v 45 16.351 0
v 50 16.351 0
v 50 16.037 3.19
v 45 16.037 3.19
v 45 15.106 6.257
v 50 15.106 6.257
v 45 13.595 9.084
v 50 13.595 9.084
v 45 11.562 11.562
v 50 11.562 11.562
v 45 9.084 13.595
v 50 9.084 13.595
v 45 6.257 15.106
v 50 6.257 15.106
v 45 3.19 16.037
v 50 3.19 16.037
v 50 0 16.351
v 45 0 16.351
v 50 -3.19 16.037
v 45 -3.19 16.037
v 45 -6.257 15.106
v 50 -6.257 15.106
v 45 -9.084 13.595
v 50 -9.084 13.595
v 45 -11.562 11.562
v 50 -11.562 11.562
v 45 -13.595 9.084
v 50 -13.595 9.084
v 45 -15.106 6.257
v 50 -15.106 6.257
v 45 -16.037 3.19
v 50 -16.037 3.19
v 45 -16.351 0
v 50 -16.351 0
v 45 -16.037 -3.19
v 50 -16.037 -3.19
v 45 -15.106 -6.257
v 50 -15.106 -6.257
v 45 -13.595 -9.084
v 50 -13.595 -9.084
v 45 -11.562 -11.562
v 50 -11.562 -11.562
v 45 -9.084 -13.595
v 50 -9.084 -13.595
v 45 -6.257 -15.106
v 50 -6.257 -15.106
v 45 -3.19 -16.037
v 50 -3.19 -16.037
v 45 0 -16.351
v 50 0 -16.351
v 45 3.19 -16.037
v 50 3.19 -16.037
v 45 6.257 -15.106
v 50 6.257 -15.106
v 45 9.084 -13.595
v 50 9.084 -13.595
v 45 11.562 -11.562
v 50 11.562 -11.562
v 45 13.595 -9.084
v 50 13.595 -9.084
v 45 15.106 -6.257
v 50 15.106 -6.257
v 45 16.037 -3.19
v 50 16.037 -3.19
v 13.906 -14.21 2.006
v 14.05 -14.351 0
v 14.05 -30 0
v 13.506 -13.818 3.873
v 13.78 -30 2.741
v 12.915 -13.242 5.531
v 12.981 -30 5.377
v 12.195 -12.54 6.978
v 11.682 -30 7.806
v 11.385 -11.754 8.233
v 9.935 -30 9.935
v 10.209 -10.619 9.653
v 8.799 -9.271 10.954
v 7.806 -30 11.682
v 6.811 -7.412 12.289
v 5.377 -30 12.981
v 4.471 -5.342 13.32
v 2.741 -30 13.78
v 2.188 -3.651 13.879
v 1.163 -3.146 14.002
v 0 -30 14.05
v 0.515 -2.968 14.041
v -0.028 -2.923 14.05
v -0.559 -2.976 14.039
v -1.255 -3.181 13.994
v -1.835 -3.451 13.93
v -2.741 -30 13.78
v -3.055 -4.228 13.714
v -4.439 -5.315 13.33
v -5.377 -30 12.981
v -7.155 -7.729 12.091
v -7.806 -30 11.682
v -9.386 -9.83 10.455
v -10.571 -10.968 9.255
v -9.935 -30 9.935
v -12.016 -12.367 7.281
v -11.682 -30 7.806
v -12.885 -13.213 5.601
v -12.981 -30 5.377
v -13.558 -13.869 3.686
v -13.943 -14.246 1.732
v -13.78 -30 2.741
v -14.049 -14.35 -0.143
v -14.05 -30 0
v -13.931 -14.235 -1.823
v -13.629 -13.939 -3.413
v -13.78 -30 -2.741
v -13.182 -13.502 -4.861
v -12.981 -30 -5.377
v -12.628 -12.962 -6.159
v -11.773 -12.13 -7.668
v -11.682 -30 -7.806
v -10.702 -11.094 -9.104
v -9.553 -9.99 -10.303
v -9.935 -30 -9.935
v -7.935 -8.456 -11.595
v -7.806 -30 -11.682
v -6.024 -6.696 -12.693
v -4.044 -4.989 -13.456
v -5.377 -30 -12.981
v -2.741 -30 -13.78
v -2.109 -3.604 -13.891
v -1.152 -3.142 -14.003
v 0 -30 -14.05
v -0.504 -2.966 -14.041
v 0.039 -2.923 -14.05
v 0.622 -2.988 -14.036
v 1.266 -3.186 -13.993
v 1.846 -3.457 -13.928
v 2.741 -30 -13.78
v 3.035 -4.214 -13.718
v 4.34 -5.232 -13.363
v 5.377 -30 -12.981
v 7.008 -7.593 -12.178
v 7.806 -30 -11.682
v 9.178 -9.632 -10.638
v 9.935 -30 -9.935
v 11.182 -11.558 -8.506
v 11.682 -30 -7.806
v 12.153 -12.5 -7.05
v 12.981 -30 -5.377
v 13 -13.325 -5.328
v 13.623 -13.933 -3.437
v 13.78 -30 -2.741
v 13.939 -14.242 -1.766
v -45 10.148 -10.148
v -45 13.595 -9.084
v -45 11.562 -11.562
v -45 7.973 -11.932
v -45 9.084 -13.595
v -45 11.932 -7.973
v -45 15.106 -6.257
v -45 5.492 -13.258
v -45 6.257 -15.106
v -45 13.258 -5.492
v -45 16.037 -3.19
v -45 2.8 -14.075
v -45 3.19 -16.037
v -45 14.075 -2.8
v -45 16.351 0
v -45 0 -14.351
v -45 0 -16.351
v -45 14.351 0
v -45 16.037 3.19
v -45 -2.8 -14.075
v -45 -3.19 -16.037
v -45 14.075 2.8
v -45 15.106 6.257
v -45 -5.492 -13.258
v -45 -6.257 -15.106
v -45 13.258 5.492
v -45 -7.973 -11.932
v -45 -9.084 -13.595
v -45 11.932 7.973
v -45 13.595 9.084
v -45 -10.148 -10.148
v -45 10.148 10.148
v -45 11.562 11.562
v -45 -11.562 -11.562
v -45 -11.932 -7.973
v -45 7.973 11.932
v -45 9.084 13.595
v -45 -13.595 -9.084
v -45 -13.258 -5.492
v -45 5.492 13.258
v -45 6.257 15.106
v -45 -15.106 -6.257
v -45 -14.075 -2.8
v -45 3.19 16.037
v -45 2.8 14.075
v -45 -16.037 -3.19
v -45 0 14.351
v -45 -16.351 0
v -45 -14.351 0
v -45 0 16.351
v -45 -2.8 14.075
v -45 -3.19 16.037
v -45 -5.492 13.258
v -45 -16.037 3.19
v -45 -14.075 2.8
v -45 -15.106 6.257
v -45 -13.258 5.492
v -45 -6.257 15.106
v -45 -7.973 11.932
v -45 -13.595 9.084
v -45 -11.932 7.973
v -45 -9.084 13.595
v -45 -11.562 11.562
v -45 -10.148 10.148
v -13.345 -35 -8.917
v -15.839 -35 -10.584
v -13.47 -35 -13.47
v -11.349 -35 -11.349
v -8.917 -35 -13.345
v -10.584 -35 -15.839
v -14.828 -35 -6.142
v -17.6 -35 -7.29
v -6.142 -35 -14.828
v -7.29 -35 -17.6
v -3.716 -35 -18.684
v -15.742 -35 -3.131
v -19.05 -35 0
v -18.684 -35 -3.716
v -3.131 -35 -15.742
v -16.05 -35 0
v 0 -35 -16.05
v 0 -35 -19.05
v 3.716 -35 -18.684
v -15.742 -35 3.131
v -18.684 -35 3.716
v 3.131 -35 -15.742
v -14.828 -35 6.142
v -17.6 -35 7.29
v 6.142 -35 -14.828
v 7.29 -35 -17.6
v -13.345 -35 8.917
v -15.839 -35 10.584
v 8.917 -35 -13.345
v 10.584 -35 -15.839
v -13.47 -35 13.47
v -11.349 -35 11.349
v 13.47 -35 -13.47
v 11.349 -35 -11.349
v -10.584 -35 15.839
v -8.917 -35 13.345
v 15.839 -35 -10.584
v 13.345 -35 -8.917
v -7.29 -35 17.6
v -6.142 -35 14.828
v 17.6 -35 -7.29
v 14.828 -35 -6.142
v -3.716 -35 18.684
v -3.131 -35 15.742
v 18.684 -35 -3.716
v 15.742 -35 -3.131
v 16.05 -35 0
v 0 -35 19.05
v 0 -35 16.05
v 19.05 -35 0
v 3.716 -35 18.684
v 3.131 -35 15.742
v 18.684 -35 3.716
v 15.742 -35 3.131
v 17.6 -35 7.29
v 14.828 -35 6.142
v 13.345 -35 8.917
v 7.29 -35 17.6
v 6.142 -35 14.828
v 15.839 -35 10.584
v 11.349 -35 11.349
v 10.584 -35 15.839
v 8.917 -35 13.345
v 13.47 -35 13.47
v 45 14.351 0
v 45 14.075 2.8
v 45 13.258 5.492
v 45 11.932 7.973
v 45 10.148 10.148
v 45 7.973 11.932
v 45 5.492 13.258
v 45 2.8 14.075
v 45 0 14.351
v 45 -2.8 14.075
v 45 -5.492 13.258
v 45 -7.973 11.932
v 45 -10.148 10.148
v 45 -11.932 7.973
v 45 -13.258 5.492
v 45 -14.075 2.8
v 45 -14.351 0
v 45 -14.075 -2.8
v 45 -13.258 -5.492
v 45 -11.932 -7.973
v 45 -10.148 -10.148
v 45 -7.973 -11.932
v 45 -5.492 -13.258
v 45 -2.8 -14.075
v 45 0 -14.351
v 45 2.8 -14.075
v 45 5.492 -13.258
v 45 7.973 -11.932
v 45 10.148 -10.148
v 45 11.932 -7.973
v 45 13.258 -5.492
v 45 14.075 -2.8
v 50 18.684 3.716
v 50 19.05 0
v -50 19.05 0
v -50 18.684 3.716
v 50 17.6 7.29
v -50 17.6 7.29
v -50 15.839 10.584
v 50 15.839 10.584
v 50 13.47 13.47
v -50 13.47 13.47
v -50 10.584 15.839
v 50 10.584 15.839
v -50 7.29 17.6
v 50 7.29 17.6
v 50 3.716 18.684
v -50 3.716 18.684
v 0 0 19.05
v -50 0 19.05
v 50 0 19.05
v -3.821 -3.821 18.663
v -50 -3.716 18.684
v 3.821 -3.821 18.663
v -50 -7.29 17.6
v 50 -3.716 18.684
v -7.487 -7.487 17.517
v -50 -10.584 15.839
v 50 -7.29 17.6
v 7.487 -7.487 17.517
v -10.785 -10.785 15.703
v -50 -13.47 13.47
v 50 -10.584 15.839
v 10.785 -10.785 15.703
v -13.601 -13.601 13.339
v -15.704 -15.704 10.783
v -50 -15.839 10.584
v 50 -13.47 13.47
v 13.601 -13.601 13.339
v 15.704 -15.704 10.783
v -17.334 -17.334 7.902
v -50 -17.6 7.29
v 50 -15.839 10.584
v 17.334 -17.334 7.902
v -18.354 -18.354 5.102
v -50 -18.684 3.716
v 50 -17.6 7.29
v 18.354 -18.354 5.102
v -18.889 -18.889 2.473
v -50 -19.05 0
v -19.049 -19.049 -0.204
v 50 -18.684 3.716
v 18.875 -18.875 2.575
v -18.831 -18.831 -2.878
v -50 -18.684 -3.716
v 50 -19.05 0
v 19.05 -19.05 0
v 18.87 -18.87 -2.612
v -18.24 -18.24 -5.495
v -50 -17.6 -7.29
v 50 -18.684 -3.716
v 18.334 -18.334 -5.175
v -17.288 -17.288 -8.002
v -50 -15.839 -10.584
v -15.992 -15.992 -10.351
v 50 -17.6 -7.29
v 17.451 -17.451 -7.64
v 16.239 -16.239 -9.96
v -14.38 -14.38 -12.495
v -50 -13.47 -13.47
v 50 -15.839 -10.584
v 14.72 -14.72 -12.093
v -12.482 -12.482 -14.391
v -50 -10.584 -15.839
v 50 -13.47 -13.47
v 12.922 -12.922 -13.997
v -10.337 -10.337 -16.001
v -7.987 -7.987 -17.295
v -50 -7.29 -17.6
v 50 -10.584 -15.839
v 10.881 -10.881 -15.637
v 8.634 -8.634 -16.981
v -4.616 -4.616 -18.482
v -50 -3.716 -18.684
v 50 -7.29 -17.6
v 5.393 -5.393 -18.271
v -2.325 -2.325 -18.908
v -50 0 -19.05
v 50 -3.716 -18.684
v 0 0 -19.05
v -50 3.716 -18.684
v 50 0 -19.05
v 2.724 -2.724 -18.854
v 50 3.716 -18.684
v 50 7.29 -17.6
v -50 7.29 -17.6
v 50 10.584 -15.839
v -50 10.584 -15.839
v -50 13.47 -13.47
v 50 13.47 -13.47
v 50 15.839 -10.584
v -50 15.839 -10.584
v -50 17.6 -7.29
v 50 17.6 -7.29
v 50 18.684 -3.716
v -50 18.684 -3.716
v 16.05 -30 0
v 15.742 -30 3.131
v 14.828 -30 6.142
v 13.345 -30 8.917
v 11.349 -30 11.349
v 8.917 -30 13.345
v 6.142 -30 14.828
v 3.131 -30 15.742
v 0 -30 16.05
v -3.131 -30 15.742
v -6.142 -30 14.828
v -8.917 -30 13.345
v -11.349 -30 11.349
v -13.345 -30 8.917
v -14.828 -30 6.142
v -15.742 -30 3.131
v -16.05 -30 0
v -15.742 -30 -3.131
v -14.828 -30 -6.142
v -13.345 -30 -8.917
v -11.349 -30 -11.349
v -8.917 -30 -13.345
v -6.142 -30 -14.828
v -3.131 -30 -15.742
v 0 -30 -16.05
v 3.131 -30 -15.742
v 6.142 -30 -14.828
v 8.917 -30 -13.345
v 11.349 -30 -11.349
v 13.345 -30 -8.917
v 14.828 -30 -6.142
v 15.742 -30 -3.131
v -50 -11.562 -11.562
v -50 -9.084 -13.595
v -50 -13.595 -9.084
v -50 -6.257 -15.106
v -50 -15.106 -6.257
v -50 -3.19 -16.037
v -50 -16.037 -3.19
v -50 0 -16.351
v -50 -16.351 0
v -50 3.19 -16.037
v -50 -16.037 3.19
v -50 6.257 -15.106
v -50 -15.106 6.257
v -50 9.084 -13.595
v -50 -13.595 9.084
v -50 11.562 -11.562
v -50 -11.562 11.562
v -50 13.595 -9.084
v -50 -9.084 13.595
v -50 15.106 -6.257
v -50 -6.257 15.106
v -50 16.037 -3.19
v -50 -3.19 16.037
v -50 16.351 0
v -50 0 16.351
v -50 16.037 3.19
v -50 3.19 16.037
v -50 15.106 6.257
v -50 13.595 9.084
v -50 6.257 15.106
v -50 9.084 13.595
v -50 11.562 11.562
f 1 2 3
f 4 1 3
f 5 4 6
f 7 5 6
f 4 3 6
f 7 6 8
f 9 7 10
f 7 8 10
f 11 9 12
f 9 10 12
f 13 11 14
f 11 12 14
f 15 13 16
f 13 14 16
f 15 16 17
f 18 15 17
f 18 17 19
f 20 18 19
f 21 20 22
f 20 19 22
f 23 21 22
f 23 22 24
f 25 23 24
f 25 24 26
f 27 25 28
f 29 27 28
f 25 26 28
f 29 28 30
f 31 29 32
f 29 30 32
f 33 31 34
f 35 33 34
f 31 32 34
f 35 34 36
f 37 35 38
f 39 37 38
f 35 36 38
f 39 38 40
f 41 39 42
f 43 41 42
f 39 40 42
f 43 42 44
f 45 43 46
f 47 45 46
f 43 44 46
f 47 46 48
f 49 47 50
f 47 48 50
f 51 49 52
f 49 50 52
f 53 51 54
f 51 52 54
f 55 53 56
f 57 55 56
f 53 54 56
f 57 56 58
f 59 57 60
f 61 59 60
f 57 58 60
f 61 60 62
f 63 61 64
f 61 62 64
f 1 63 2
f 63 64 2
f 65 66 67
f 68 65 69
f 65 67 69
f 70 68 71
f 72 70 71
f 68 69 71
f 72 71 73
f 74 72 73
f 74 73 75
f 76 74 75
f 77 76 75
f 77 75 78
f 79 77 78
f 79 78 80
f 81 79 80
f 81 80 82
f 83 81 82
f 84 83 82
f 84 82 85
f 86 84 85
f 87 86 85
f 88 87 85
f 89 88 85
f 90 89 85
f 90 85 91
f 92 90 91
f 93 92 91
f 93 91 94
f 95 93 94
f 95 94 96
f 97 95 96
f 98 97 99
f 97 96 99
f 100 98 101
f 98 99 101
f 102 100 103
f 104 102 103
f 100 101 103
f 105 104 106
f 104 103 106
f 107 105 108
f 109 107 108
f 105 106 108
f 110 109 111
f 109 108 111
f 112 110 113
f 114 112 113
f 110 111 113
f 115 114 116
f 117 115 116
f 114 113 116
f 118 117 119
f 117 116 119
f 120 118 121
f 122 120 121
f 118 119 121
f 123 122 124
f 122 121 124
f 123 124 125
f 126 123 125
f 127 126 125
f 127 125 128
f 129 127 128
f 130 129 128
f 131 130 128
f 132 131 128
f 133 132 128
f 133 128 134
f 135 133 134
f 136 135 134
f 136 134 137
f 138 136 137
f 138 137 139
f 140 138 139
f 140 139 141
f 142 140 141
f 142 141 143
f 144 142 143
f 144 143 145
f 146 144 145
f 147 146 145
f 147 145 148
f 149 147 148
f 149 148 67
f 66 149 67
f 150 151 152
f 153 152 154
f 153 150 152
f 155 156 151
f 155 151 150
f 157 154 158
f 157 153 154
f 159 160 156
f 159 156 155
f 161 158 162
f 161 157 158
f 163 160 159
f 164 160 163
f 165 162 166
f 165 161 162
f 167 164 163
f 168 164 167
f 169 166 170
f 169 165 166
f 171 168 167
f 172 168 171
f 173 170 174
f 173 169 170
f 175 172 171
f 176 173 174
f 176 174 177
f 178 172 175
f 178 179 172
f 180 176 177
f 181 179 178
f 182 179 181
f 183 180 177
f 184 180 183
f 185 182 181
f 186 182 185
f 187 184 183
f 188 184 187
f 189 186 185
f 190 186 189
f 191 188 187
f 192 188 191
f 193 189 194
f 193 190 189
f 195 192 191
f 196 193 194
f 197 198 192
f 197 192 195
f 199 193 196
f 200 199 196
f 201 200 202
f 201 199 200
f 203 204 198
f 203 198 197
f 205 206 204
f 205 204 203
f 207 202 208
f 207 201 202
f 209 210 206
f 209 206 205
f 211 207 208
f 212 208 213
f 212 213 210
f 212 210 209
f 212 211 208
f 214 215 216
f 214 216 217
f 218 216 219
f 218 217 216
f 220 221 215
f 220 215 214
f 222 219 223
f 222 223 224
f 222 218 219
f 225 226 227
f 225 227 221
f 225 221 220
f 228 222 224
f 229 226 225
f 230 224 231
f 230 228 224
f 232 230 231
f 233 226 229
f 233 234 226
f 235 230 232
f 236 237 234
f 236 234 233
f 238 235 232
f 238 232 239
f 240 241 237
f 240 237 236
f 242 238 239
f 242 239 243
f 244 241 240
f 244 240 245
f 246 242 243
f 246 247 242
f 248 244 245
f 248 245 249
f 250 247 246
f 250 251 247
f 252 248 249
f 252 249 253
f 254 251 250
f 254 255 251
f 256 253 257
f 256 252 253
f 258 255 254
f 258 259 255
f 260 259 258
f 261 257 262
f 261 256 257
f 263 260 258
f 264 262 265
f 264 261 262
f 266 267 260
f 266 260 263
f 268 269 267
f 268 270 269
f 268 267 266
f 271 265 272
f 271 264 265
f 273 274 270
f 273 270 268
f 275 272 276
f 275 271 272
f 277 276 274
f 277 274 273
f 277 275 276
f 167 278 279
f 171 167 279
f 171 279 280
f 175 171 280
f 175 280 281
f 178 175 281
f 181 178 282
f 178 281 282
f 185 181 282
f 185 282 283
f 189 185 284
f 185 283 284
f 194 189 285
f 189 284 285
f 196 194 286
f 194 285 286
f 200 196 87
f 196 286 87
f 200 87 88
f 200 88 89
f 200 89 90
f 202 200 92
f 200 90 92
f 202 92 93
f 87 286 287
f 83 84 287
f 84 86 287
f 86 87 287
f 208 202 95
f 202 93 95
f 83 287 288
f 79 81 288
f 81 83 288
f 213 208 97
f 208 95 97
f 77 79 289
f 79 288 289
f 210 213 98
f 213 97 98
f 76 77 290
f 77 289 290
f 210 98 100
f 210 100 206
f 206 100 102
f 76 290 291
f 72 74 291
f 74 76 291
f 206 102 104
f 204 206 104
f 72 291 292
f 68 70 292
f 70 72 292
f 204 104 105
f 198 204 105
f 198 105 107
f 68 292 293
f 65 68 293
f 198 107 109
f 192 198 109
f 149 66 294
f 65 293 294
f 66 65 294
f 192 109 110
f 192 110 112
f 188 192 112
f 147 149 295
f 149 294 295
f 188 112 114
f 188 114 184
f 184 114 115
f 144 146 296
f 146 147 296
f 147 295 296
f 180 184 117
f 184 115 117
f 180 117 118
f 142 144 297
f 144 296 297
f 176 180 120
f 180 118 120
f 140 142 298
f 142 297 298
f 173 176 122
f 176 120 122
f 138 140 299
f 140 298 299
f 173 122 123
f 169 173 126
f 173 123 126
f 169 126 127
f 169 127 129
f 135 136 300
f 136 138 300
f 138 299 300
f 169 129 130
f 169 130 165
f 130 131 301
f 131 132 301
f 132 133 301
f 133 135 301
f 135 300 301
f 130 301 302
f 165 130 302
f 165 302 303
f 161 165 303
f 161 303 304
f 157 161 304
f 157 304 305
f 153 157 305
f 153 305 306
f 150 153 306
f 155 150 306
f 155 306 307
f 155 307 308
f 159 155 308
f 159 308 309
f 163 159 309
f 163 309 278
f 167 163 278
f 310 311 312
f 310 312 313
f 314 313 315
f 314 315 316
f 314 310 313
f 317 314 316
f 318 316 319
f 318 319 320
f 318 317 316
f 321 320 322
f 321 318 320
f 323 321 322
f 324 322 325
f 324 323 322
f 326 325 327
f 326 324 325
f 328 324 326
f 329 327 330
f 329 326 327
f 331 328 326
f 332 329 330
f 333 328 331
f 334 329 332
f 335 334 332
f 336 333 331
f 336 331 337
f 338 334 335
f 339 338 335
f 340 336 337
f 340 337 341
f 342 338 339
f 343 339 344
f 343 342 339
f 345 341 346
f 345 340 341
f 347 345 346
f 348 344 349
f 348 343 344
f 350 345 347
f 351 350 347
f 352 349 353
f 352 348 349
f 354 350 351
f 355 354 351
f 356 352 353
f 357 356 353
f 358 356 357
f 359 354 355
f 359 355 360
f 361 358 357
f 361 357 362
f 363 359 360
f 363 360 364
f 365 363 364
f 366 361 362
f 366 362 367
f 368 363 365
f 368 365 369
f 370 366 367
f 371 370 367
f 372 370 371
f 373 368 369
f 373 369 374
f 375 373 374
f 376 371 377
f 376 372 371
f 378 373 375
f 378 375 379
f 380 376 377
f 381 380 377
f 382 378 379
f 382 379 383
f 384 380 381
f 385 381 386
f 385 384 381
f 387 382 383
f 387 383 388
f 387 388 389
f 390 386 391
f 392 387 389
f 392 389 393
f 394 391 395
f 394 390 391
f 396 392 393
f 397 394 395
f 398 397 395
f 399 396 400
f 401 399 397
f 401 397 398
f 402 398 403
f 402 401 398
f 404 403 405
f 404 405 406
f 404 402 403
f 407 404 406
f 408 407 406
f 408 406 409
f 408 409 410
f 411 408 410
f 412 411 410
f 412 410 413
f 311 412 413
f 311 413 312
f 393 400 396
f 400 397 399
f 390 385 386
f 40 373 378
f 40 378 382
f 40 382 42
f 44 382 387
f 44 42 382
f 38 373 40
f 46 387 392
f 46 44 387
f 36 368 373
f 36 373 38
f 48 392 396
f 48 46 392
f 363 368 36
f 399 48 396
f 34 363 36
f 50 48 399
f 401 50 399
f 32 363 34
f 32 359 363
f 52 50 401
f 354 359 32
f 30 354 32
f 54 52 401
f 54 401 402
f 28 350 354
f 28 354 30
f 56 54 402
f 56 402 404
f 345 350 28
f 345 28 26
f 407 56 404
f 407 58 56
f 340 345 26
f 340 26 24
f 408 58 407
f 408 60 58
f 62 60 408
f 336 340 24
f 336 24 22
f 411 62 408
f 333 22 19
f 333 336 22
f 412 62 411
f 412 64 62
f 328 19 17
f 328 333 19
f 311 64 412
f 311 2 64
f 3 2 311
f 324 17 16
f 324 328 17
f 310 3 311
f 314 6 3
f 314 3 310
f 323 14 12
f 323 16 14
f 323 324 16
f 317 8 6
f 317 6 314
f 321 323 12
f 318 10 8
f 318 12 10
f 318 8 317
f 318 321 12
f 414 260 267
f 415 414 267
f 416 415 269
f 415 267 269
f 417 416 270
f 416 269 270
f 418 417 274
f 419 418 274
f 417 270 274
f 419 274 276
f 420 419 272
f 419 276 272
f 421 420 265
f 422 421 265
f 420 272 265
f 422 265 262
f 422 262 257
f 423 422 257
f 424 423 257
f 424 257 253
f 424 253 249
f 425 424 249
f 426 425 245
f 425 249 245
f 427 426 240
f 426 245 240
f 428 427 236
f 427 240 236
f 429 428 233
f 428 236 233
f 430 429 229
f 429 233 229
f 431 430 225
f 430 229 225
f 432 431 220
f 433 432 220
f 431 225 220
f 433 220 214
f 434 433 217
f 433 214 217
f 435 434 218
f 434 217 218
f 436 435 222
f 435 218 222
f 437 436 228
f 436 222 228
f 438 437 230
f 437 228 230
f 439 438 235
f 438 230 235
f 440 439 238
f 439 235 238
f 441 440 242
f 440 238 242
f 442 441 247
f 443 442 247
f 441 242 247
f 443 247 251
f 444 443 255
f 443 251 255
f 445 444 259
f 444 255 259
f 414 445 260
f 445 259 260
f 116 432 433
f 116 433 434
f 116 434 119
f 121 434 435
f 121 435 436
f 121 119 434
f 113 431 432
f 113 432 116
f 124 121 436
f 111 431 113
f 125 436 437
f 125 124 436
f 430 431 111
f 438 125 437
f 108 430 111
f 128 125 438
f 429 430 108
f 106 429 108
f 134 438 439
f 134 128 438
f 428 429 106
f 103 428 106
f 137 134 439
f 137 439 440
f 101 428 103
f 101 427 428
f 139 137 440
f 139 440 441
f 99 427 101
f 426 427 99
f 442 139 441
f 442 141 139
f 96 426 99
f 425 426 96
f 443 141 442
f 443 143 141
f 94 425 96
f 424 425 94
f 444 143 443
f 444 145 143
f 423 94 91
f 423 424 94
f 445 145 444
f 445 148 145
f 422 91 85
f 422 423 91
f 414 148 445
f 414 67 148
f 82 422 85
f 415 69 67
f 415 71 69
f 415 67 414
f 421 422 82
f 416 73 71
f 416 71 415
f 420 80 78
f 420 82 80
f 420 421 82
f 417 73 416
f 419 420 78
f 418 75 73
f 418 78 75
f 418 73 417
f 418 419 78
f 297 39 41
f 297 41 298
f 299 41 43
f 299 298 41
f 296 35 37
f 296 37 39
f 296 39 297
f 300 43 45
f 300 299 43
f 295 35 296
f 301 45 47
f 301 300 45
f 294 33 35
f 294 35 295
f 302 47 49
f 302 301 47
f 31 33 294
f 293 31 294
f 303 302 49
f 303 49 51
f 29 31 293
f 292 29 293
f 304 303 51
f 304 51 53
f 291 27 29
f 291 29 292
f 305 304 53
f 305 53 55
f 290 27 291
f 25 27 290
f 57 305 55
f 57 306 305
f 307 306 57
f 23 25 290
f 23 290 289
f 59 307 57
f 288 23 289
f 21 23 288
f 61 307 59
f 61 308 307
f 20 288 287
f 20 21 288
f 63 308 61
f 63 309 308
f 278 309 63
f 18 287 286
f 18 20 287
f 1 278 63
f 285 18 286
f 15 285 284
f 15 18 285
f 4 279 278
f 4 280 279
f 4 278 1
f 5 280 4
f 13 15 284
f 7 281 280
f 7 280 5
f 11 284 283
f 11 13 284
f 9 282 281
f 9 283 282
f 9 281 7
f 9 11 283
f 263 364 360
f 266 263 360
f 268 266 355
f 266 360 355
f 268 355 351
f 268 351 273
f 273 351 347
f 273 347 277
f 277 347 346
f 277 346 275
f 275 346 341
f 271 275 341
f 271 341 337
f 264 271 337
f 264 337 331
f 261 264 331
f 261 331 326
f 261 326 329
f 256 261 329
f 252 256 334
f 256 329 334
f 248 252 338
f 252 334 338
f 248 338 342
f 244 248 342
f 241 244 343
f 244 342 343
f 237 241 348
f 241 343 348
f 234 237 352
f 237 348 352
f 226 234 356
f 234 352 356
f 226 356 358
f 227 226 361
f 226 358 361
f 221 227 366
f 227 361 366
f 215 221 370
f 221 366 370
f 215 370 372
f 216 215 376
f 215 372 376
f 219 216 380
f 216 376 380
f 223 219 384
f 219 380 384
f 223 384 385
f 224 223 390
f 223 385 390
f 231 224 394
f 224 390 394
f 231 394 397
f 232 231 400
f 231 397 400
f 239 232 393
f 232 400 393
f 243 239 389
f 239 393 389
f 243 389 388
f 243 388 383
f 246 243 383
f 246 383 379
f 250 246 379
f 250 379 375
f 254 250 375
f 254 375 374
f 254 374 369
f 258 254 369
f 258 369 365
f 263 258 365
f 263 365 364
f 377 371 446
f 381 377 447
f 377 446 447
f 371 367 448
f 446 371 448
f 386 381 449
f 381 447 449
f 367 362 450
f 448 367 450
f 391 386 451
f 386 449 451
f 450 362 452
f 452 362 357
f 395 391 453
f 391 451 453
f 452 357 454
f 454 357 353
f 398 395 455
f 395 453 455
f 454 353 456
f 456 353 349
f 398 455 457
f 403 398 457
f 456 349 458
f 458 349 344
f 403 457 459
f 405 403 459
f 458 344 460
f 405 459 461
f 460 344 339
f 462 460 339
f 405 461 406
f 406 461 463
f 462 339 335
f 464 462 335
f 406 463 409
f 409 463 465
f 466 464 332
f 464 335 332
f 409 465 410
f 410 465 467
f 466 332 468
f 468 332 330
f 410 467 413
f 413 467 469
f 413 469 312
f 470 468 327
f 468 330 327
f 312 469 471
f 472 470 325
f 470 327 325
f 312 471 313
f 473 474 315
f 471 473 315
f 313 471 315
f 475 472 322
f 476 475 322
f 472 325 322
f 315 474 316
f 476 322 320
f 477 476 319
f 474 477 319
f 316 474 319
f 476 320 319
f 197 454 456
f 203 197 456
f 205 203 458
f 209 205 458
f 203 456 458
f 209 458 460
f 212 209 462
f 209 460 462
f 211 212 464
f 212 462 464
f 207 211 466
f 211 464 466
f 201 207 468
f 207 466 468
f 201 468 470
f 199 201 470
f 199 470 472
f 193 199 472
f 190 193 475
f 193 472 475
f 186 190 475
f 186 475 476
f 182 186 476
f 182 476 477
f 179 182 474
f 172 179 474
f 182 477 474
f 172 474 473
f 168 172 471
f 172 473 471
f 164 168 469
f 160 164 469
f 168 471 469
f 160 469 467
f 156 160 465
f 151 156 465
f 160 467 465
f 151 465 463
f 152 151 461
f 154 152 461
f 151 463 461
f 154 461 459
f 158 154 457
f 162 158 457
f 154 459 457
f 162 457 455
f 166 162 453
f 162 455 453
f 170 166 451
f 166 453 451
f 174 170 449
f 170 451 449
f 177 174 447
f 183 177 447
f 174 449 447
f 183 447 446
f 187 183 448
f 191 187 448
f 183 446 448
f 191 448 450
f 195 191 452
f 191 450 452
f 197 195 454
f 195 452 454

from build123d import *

# Parameters (mm, degrees)
F0_R      = 19.05
F2_DEPTH  = 50
F1_R      = 19.05
F4_DEPTH  = 35
F3_R      = 14.3508300954
F5_DEPTH  = 100.001
F6_R      = 14.05
F7_DEPTH  = 32.078017988
F8_R      = 16.05
F9_DEPTH  = 5
F10_R     = 16.3508300954
F11_DEPTH = 5
F12_R     = 16.3508300954
F13_DEPTH = 5


with BuildPart() as f2:
    # F0 (on Right) → F2 (new body, symmetric)
    with BuildSketch(Plane.YZ):
        Circle(F0_R)
    extrude(amount=F2_DEPTH, both=True)

    # F1 (on Front) → F4 (join)
    with BuildSketch(Plane.XZ):
        Circle(F1_R)
    extrude(amount=F4_DEPTH)

    # F3 (on face) → F5 (cut, through all)
    with BuildSketch(Plane.YZ.offset(50)):
        Circle(F3_R)
    extrude(amount=-F5_DEPTH, mode=Mode.SUBTRACT)

    # F6 (on face) → F7 (cut, through all)
    with BuildSketch(Plane.XZ.offset(35)):
        Circle(F6_R)
    extrude(amount=-F7_DEPTH, mode=Mode.SUBTRACT)

    # F8 (on face) → F9 (cut)
    with BuildSketch(Plane.XZ.offset(35)):
        Circle(F8_R)
    extrude(amount=-F9_DEPTH, mode=Mode.SUBTRACT)

    # F10 (on face) → F11 (cut)
    with BuildSketch(Plane.YZ.offset(50)):
        Circle(F10_R)
    extrude(amount=-F11_DEPTH, mode=Mode.SUBTRACT)

    # F12 (on face) → F13 (cut)
    with BuildSketch(Plane(origin=(-50, 0, 0), x_dir=(0, -1, 0), z_dir=(-1, 0, 0))):
        Circle(F12_R)
    extrude(amount=-F13_DEPTH, mode=Mode.SUBTRACT)


solid = f2.part
